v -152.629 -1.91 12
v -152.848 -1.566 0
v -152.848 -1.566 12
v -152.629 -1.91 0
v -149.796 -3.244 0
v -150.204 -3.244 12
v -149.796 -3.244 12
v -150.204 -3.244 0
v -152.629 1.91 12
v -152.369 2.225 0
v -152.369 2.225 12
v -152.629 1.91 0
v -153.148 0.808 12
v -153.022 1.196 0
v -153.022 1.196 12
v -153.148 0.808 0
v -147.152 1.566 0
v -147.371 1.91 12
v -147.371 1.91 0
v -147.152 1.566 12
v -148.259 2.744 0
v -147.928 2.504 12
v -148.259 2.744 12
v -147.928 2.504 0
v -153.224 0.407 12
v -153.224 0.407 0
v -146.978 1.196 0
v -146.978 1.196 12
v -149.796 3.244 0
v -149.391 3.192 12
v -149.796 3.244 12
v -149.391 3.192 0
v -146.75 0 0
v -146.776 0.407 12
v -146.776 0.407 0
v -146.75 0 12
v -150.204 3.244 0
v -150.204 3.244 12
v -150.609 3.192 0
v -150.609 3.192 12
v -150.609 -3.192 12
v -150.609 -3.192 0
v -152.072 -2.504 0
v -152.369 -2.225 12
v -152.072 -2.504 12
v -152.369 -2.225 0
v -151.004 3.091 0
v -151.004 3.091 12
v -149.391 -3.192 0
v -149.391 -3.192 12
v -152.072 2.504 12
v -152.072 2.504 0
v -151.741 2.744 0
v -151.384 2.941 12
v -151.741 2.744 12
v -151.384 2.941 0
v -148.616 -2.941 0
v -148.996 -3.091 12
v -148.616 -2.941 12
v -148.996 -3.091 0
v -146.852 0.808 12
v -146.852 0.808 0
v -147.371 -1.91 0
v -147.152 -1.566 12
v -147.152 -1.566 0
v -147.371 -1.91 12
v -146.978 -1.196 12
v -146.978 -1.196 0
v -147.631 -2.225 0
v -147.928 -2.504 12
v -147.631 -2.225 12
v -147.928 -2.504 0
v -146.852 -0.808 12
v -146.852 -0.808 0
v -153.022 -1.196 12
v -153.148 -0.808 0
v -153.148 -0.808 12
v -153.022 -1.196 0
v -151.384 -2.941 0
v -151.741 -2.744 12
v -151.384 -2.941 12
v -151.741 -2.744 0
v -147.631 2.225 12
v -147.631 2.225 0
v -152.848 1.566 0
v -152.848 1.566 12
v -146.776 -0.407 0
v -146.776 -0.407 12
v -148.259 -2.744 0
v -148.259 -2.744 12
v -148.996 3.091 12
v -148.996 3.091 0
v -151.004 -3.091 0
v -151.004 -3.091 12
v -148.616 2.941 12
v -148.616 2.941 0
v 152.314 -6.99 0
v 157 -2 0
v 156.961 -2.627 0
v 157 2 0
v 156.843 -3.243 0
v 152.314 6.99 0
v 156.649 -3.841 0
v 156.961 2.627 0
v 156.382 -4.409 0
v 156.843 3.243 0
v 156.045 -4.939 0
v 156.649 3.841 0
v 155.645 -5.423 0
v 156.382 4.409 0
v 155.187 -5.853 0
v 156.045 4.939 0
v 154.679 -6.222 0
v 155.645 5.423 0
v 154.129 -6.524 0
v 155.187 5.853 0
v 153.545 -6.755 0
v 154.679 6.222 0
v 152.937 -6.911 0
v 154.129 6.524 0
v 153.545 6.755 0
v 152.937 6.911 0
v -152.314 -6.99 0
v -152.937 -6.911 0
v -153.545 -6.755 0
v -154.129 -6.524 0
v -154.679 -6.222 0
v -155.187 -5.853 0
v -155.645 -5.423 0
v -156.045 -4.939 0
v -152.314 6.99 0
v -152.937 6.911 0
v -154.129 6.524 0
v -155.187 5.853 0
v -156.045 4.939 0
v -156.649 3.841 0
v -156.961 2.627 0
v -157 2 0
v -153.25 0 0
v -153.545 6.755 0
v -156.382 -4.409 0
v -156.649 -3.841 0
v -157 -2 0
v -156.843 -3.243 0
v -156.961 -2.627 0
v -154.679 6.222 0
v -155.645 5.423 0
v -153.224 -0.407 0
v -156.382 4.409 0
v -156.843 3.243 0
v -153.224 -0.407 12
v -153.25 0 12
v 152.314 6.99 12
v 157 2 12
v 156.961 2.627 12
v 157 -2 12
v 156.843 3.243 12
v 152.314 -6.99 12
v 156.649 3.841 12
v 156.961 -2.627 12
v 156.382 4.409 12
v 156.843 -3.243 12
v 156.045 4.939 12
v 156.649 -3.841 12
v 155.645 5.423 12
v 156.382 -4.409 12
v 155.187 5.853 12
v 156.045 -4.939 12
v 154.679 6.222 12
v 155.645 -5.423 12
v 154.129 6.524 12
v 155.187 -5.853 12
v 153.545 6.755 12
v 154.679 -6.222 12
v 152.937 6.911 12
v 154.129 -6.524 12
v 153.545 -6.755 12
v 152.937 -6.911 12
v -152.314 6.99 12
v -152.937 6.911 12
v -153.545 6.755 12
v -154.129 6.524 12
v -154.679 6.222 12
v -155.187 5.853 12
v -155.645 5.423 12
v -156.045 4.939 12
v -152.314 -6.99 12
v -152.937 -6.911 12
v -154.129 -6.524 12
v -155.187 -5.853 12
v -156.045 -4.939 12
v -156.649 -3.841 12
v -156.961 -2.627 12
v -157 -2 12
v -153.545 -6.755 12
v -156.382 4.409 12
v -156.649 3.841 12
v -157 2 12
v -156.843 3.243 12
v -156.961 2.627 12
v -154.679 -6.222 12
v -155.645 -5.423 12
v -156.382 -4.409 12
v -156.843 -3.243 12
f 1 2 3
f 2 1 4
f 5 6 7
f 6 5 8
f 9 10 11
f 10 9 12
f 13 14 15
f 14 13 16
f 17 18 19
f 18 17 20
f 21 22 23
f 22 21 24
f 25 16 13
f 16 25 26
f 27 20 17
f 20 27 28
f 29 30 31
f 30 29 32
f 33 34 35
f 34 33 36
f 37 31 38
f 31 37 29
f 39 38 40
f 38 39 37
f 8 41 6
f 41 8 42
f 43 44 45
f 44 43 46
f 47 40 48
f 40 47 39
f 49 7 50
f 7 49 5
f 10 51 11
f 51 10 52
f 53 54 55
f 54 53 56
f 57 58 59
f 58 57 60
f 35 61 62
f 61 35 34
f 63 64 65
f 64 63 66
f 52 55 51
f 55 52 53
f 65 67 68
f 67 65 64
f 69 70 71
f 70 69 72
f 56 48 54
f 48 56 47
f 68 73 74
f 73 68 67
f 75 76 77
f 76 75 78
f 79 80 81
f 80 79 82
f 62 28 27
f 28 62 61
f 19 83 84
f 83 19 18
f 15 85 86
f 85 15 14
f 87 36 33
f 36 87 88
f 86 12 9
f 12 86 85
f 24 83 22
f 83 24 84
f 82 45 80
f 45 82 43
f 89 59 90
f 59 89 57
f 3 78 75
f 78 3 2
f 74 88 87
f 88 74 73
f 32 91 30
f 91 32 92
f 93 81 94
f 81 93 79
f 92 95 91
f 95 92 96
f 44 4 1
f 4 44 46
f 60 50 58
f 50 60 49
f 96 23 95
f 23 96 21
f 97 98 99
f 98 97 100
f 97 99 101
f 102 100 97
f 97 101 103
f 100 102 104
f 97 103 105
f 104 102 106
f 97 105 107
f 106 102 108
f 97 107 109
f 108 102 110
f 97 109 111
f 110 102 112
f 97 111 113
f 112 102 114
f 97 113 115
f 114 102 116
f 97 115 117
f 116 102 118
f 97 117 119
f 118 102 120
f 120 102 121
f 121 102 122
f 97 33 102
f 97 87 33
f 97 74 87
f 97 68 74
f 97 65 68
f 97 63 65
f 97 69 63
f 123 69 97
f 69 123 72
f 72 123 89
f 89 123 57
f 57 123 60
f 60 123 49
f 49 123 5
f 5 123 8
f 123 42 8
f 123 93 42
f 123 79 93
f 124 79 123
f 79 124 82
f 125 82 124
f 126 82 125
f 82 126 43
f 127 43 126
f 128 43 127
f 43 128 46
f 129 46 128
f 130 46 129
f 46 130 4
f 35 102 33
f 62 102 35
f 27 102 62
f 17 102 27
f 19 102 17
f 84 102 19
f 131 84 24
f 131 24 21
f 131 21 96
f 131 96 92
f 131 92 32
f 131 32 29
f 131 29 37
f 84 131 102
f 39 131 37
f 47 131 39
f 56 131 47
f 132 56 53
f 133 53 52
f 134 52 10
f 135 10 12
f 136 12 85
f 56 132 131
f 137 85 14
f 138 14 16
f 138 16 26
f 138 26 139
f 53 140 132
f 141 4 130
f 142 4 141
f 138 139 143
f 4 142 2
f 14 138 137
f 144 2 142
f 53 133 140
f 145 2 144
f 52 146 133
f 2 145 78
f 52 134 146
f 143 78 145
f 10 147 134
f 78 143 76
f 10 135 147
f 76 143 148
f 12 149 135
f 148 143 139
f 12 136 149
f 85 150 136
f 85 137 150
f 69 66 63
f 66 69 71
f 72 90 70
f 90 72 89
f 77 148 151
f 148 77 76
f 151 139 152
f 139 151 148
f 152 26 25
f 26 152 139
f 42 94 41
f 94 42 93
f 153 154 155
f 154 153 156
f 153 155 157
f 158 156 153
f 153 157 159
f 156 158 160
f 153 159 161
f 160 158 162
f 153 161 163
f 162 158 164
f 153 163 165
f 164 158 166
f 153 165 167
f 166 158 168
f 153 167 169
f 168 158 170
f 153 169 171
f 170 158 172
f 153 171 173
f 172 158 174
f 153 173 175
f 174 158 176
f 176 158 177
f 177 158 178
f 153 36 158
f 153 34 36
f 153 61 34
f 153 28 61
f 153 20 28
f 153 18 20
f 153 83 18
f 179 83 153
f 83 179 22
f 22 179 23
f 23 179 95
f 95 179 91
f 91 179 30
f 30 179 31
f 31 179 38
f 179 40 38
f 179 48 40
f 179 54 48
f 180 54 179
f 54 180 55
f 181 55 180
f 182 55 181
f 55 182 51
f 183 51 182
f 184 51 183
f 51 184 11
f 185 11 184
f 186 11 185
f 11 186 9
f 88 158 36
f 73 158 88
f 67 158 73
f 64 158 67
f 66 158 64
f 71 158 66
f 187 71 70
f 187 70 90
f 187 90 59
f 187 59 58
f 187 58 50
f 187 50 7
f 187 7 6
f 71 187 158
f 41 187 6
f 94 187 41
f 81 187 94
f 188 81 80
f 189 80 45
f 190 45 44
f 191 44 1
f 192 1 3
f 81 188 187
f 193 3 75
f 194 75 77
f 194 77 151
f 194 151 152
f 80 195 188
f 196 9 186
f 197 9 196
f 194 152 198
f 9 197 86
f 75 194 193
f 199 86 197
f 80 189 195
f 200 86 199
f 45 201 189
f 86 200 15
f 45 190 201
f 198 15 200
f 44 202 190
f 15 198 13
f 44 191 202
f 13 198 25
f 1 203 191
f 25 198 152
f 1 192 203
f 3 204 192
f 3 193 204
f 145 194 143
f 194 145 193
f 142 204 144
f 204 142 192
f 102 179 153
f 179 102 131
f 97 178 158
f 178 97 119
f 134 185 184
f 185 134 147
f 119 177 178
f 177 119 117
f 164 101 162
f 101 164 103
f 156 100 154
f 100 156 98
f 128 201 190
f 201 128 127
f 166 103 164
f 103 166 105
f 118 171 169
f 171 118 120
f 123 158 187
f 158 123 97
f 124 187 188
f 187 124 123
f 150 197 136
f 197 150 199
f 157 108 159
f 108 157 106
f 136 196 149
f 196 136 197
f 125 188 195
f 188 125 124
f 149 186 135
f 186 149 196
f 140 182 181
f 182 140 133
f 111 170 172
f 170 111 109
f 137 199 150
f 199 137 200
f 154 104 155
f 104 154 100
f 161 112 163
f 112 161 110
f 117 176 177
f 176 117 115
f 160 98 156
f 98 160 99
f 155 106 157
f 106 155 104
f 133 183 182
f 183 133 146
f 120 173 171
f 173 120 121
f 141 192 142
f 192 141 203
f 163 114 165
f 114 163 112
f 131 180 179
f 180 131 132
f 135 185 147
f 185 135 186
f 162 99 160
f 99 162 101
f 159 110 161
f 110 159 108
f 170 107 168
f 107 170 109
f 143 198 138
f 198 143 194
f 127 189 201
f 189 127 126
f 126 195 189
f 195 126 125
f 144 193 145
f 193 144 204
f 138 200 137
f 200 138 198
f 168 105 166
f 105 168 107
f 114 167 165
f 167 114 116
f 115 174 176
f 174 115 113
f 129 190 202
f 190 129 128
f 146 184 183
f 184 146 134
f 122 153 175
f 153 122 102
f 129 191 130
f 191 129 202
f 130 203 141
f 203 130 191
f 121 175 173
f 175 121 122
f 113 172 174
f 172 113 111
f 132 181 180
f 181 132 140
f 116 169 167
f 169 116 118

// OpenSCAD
$fn = 50;


difference() {
	union() {
		hull() {
			translate(v = [-152.0000000000, 2.0000000000, 0]) {
				cylinder(h = 12, r = 5);
			}
			translate(v = [152.0000000000, 2.0000000000, 0]) {
				cylinder(h = 12, r = 5);
			}
			translate(v = [-152.0000000000, -2.0000000000, 0]) {
				cylinder(h = 12, r = 5);
			}
			translate(v = [152.0000000000, -2.0000000000, 0]) {
				cylinder(h = 12, r = 5);
			}
		}
	}
	union() {
		translate(v = [-150.0000000000, 0.0000000000, 0]) {
			cylinder(h = 12, r = 3.2500000000);
		}
		translate(v = [-150.0000000000, 0.0000000000, 0]) {
			cylinder(h = 12, r = 1.8000000000);
		}
		translate(v = [-150.0000000000, 0.0000000000, 0]) {
			cylinder(h = 12, r = 1.8000000000);
		}
		translate(v = [-150.0000000000, 0.0000000000, 0]) {
			cylinder(h = 12, r = 1.8000000000);
		}
	}
}
